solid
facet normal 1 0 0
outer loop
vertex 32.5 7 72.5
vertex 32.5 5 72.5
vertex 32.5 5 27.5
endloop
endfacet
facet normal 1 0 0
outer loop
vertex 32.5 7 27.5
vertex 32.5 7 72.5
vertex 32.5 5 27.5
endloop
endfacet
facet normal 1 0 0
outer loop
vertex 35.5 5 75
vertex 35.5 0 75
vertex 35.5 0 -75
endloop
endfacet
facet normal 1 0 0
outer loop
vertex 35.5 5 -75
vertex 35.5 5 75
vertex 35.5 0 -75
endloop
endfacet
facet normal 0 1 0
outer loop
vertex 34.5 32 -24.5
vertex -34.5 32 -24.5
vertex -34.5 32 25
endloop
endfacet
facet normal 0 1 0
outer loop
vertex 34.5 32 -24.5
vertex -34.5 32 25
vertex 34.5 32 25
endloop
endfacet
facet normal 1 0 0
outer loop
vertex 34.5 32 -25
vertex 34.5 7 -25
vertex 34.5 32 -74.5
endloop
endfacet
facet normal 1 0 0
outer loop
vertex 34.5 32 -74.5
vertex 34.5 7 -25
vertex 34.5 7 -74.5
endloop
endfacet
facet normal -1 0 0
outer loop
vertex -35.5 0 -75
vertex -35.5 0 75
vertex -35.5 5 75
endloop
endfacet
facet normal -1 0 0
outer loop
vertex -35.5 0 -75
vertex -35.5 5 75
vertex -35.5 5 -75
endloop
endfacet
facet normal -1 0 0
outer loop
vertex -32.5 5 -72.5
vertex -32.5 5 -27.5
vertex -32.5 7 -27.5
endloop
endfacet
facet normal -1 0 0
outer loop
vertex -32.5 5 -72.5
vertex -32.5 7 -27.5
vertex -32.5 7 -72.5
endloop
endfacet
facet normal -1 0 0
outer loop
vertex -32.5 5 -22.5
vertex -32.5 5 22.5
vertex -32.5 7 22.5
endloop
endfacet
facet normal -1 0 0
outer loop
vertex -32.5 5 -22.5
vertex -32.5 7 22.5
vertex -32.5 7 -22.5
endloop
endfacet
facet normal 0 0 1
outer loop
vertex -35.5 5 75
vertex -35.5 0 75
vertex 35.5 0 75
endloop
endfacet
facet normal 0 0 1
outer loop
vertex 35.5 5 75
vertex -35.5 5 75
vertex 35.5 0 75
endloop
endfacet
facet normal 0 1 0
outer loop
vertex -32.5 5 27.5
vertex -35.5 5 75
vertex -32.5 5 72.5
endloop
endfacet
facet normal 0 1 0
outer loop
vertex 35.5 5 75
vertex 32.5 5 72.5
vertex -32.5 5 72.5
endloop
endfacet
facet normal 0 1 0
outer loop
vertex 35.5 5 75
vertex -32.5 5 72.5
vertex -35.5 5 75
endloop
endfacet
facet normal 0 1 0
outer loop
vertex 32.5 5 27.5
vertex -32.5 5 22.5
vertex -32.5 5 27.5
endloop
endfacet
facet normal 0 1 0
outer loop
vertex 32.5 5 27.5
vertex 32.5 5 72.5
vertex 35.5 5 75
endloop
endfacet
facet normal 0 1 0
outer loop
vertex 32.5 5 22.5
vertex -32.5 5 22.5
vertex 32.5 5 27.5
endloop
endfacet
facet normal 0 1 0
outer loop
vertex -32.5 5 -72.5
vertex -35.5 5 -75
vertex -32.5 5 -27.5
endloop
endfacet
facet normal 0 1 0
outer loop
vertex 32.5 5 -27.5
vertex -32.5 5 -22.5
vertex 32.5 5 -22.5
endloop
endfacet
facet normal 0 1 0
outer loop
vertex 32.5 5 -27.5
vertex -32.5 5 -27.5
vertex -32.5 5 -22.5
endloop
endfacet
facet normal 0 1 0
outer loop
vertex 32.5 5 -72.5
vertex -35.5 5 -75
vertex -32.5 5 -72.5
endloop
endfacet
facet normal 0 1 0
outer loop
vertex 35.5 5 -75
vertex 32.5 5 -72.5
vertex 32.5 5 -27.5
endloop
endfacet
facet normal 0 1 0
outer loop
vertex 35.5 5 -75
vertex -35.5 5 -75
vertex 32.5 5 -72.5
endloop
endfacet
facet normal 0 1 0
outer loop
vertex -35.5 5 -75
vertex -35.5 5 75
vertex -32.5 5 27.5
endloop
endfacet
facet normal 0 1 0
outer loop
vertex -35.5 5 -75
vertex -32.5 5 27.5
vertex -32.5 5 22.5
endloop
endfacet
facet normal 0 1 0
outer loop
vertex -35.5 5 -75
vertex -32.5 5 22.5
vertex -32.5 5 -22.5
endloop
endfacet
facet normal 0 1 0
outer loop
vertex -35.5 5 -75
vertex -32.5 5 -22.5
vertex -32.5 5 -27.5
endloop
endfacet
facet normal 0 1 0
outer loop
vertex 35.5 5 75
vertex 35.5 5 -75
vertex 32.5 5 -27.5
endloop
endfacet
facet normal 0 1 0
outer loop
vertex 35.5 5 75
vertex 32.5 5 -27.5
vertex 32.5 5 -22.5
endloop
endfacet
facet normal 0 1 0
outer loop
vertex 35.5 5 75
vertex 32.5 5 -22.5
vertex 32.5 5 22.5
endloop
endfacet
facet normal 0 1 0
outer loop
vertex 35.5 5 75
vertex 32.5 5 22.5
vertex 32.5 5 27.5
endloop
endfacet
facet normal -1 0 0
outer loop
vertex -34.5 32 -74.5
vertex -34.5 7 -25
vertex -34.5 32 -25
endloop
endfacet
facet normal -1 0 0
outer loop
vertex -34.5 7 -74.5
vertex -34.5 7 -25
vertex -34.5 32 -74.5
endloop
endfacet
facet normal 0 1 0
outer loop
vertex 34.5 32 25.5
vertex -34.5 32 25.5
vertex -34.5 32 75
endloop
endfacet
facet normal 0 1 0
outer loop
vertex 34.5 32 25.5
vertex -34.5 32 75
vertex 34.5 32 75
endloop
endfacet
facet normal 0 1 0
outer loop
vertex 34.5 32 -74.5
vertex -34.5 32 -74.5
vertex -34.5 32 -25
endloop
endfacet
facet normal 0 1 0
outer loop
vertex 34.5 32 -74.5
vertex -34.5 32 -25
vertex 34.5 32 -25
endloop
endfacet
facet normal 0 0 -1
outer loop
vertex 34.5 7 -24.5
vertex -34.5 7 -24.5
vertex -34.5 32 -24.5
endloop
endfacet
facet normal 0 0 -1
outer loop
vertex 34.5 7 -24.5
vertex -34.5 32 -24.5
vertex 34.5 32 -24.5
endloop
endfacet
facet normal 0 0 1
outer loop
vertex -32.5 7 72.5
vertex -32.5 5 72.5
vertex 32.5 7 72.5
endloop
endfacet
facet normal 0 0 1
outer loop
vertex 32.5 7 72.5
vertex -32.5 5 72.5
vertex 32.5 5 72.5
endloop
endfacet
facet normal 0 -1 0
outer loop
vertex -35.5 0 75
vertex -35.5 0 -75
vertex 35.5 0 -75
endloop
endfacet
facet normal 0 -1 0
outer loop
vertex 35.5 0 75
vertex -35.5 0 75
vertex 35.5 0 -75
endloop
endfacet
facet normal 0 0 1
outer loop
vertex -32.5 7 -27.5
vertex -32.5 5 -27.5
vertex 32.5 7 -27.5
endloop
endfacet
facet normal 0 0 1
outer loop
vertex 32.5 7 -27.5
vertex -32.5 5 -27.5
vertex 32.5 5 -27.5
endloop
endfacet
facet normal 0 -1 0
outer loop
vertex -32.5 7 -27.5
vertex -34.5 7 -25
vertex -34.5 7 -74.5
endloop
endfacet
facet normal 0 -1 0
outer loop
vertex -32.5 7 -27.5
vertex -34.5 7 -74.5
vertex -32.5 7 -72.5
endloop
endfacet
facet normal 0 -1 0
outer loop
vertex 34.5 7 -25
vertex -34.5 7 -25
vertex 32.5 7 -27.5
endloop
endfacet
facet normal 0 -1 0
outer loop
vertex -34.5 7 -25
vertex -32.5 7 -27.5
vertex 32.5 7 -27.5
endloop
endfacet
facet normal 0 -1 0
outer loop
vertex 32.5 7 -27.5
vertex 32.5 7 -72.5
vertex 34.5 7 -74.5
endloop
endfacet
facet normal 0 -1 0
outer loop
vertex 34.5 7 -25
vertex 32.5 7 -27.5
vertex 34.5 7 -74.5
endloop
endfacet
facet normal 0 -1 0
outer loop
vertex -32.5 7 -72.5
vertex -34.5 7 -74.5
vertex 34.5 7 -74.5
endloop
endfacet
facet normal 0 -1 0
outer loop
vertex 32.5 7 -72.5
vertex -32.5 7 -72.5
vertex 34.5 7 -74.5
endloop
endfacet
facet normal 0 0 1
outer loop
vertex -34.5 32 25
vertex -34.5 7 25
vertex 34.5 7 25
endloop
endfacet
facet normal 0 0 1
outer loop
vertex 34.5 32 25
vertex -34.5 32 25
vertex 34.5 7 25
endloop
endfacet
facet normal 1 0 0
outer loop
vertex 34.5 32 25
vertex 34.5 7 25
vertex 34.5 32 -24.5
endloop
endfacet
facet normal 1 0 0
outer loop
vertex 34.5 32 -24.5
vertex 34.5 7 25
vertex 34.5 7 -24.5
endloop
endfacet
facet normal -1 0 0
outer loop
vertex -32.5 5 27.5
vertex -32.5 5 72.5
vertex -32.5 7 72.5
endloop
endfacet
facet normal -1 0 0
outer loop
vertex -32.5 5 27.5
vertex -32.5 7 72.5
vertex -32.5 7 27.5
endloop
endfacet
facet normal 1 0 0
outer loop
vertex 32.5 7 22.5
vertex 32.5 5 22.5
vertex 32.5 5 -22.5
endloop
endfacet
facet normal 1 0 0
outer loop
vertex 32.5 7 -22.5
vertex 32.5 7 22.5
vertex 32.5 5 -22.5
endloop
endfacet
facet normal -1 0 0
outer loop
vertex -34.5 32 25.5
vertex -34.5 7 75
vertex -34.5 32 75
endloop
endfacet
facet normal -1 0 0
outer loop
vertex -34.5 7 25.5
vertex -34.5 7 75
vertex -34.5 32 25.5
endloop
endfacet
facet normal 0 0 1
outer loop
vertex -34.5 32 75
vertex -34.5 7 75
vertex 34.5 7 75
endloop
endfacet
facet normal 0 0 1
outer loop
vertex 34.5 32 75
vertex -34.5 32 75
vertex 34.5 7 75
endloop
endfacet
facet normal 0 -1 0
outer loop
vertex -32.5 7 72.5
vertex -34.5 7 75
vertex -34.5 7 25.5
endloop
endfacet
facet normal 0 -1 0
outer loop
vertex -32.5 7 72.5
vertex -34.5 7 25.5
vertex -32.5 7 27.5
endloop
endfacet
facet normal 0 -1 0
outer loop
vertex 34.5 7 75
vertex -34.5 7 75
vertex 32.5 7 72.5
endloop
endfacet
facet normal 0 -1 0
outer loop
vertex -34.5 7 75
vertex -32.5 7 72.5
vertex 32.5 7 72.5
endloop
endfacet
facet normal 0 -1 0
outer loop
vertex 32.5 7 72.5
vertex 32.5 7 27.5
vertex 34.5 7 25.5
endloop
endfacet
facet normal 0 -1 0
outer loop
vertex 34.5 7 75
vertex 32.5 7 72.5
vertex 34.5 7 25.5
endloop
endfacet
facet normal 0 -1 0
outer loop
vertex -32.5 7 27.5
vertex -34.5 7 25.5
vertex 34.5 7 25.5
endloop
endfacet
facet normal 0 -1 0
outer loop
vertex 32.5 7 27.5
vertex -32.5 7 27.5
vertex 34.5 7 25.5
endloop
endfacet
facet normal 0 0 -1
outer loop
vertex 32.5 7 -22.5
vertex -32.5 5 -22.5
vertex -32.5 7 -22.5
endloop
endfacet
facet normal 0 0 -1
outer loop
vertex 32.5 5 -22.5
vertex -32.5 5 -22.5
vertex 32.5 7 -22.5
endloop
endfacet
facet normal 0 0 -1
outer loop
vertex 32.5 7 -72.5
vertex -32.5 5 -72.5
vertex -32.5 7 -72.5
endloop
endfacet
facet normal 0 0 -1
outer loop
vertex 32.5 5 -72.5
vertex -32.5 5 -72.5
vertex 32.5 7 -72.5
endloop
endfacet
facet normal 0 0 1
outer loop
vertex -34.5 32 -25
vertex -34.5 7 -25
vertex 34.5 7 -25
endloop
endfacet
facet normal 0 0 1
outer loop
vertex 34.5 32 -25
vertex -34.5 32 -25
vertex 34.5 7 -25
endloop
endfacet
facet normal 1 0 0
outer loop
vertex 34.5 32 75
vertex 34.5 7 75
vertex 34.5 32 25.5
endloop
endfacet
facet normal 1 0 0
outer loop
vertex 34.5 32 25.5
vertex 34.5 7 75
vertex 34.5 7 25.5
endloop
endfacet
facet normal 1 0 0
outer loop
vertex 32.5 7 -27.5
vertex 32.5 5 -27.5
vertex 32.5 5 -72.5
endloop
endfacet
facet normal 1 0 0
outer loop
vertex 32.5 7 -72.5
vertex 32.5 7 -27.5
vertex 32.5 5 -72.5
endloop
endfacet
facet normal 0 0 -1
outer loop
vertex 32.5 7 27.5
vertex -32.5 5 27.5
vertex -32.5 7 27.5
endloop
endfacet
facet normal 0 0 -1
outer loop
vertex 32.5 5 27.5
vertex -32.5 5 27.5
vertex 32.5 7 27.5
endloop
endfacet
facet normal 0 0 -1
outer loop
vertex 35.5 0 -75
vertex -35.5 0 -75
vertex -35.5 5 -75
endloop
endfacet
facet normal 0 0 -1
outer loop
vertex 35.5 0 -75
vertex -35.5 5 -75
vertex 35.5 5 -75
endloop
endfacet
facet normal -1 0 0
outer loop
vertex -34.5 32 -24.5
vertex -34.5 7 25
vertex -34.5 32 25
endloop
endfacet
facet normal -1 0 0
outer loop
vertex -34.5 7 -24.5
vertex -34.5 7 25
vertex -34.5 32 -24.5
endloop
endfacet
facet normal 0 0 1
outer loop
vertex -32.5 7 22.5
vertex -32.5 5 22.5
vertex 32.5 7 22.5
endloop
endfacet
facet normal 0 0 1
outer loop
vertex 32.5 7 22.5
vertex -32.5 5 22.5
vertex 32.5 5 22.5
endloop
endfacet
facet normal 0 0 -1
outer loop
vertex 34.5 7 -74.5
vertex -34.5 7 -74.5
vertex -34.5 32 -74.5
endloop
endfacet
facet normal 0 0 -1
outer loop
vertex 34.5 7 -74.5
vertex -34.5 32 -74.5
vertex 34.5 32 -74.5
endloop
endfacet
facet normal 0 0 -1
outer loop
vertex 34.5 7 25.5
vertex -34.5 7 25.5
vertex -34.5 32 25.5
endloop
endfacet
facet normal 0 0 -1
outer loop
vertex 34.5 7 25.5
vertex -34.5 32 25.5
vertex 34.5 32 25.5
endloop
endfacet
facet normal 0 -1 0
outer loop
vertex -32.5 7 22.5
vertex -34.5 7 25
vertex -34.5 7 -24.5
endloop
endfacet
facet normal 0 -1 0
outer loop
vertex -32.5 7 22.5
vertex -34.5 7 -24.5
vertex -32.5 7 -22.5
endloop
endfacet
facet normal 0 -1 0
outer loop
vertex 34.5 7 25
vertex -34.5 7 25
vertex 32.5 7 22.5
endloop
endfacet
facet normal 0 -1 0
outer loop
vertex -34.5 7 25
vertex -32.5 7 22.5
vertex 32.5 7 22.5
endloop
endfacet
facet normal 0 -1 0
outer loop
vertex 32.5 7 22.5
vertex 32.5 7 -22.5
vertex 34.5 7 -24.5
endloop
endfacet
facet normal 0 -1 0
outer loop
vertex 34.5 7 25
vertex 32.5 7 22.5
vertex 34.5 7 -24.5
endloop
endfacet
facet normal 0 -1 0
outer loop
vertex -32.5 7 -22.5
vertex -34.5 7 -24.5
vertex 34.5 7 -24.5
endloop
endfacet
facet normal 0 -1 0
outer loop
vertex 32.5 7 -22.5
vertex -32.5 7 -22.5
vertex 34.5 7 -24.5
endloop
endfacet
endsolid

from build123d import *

# Parameters (mm, degrees)
SKETCH1_W           = 71
SKETCH1_H           = 150
BOSS_EXTRUDE1_DEPTH = 5
SKETCH2_W           = 65
SKETCH2_H           = 45
BOSS_EXTRUDE3_DEPTH = 2
LPATTERN1_COUNT     = 3
LPATTERN1_PITCH     = 50
SKETCH3_W           = 69
SKETCH3_H           = 49.5
BOSS_EXTRUDE8_DEPTH = 25
LPATTERN5_COUNT     = 3
LPATTERN5_PITCH     = 50


with BuildPart() as part:
    # Sketch1 → Boss-Extrude1 (new body)
    with BuildSketch(Plane(origin=(0, 0, 0), x_dir=(1, 0, 0), z_dir=(0, 1, 0))):
        Rectangle(SKETCH1_W, SKETCH1_H)
    extrude(amount=BOSS_EXTRUDE1_DEPTH)

    # Sketch2 → Boss-Extrude3 (add)
    with BuildSketch(Plane(origin=(0, 5, 0), x_dir=(1, 0, 0), z_dir=(0, 1, 0))):
        with Locations((0, -50)):
            Rectangle(SKETCH2_W, SKETCH2_H)
    boss_extrude3 = extrude(amount=BOSS_EXTRUDE3_DEPTH)

    # LPattern1: Boss-Extrude3 ×3
    with Locations(*[(0, 0, -i * LPATTERN1_PITCH) for i in range(1, LPATTERN1_COUNT)]):
        add(boss_extrude3)

    # Sketch3 → Boss-Extrude8 (add)
    with BuildSketch(Plane(origin=(0, 7, 0), x_dir=(1, 0, 0), z_dir=(0, 1, 0))):
        with Locations((0, -50.25)):
            Rectangle(SKETCH3_W, SKETCH3_H)
    boss_extrude8 = extrude(amount=BOSS_EXTRUDE8_DEPTH)

    # LPattern5: Boss-Extrude8 ×3
    with Locations(*[(0, 0, -i * LPATTERN5_PITCH) for i in range(1, LPATTERN5_COUNT)]):
        add(boss_extrude8)


solid = part.part
